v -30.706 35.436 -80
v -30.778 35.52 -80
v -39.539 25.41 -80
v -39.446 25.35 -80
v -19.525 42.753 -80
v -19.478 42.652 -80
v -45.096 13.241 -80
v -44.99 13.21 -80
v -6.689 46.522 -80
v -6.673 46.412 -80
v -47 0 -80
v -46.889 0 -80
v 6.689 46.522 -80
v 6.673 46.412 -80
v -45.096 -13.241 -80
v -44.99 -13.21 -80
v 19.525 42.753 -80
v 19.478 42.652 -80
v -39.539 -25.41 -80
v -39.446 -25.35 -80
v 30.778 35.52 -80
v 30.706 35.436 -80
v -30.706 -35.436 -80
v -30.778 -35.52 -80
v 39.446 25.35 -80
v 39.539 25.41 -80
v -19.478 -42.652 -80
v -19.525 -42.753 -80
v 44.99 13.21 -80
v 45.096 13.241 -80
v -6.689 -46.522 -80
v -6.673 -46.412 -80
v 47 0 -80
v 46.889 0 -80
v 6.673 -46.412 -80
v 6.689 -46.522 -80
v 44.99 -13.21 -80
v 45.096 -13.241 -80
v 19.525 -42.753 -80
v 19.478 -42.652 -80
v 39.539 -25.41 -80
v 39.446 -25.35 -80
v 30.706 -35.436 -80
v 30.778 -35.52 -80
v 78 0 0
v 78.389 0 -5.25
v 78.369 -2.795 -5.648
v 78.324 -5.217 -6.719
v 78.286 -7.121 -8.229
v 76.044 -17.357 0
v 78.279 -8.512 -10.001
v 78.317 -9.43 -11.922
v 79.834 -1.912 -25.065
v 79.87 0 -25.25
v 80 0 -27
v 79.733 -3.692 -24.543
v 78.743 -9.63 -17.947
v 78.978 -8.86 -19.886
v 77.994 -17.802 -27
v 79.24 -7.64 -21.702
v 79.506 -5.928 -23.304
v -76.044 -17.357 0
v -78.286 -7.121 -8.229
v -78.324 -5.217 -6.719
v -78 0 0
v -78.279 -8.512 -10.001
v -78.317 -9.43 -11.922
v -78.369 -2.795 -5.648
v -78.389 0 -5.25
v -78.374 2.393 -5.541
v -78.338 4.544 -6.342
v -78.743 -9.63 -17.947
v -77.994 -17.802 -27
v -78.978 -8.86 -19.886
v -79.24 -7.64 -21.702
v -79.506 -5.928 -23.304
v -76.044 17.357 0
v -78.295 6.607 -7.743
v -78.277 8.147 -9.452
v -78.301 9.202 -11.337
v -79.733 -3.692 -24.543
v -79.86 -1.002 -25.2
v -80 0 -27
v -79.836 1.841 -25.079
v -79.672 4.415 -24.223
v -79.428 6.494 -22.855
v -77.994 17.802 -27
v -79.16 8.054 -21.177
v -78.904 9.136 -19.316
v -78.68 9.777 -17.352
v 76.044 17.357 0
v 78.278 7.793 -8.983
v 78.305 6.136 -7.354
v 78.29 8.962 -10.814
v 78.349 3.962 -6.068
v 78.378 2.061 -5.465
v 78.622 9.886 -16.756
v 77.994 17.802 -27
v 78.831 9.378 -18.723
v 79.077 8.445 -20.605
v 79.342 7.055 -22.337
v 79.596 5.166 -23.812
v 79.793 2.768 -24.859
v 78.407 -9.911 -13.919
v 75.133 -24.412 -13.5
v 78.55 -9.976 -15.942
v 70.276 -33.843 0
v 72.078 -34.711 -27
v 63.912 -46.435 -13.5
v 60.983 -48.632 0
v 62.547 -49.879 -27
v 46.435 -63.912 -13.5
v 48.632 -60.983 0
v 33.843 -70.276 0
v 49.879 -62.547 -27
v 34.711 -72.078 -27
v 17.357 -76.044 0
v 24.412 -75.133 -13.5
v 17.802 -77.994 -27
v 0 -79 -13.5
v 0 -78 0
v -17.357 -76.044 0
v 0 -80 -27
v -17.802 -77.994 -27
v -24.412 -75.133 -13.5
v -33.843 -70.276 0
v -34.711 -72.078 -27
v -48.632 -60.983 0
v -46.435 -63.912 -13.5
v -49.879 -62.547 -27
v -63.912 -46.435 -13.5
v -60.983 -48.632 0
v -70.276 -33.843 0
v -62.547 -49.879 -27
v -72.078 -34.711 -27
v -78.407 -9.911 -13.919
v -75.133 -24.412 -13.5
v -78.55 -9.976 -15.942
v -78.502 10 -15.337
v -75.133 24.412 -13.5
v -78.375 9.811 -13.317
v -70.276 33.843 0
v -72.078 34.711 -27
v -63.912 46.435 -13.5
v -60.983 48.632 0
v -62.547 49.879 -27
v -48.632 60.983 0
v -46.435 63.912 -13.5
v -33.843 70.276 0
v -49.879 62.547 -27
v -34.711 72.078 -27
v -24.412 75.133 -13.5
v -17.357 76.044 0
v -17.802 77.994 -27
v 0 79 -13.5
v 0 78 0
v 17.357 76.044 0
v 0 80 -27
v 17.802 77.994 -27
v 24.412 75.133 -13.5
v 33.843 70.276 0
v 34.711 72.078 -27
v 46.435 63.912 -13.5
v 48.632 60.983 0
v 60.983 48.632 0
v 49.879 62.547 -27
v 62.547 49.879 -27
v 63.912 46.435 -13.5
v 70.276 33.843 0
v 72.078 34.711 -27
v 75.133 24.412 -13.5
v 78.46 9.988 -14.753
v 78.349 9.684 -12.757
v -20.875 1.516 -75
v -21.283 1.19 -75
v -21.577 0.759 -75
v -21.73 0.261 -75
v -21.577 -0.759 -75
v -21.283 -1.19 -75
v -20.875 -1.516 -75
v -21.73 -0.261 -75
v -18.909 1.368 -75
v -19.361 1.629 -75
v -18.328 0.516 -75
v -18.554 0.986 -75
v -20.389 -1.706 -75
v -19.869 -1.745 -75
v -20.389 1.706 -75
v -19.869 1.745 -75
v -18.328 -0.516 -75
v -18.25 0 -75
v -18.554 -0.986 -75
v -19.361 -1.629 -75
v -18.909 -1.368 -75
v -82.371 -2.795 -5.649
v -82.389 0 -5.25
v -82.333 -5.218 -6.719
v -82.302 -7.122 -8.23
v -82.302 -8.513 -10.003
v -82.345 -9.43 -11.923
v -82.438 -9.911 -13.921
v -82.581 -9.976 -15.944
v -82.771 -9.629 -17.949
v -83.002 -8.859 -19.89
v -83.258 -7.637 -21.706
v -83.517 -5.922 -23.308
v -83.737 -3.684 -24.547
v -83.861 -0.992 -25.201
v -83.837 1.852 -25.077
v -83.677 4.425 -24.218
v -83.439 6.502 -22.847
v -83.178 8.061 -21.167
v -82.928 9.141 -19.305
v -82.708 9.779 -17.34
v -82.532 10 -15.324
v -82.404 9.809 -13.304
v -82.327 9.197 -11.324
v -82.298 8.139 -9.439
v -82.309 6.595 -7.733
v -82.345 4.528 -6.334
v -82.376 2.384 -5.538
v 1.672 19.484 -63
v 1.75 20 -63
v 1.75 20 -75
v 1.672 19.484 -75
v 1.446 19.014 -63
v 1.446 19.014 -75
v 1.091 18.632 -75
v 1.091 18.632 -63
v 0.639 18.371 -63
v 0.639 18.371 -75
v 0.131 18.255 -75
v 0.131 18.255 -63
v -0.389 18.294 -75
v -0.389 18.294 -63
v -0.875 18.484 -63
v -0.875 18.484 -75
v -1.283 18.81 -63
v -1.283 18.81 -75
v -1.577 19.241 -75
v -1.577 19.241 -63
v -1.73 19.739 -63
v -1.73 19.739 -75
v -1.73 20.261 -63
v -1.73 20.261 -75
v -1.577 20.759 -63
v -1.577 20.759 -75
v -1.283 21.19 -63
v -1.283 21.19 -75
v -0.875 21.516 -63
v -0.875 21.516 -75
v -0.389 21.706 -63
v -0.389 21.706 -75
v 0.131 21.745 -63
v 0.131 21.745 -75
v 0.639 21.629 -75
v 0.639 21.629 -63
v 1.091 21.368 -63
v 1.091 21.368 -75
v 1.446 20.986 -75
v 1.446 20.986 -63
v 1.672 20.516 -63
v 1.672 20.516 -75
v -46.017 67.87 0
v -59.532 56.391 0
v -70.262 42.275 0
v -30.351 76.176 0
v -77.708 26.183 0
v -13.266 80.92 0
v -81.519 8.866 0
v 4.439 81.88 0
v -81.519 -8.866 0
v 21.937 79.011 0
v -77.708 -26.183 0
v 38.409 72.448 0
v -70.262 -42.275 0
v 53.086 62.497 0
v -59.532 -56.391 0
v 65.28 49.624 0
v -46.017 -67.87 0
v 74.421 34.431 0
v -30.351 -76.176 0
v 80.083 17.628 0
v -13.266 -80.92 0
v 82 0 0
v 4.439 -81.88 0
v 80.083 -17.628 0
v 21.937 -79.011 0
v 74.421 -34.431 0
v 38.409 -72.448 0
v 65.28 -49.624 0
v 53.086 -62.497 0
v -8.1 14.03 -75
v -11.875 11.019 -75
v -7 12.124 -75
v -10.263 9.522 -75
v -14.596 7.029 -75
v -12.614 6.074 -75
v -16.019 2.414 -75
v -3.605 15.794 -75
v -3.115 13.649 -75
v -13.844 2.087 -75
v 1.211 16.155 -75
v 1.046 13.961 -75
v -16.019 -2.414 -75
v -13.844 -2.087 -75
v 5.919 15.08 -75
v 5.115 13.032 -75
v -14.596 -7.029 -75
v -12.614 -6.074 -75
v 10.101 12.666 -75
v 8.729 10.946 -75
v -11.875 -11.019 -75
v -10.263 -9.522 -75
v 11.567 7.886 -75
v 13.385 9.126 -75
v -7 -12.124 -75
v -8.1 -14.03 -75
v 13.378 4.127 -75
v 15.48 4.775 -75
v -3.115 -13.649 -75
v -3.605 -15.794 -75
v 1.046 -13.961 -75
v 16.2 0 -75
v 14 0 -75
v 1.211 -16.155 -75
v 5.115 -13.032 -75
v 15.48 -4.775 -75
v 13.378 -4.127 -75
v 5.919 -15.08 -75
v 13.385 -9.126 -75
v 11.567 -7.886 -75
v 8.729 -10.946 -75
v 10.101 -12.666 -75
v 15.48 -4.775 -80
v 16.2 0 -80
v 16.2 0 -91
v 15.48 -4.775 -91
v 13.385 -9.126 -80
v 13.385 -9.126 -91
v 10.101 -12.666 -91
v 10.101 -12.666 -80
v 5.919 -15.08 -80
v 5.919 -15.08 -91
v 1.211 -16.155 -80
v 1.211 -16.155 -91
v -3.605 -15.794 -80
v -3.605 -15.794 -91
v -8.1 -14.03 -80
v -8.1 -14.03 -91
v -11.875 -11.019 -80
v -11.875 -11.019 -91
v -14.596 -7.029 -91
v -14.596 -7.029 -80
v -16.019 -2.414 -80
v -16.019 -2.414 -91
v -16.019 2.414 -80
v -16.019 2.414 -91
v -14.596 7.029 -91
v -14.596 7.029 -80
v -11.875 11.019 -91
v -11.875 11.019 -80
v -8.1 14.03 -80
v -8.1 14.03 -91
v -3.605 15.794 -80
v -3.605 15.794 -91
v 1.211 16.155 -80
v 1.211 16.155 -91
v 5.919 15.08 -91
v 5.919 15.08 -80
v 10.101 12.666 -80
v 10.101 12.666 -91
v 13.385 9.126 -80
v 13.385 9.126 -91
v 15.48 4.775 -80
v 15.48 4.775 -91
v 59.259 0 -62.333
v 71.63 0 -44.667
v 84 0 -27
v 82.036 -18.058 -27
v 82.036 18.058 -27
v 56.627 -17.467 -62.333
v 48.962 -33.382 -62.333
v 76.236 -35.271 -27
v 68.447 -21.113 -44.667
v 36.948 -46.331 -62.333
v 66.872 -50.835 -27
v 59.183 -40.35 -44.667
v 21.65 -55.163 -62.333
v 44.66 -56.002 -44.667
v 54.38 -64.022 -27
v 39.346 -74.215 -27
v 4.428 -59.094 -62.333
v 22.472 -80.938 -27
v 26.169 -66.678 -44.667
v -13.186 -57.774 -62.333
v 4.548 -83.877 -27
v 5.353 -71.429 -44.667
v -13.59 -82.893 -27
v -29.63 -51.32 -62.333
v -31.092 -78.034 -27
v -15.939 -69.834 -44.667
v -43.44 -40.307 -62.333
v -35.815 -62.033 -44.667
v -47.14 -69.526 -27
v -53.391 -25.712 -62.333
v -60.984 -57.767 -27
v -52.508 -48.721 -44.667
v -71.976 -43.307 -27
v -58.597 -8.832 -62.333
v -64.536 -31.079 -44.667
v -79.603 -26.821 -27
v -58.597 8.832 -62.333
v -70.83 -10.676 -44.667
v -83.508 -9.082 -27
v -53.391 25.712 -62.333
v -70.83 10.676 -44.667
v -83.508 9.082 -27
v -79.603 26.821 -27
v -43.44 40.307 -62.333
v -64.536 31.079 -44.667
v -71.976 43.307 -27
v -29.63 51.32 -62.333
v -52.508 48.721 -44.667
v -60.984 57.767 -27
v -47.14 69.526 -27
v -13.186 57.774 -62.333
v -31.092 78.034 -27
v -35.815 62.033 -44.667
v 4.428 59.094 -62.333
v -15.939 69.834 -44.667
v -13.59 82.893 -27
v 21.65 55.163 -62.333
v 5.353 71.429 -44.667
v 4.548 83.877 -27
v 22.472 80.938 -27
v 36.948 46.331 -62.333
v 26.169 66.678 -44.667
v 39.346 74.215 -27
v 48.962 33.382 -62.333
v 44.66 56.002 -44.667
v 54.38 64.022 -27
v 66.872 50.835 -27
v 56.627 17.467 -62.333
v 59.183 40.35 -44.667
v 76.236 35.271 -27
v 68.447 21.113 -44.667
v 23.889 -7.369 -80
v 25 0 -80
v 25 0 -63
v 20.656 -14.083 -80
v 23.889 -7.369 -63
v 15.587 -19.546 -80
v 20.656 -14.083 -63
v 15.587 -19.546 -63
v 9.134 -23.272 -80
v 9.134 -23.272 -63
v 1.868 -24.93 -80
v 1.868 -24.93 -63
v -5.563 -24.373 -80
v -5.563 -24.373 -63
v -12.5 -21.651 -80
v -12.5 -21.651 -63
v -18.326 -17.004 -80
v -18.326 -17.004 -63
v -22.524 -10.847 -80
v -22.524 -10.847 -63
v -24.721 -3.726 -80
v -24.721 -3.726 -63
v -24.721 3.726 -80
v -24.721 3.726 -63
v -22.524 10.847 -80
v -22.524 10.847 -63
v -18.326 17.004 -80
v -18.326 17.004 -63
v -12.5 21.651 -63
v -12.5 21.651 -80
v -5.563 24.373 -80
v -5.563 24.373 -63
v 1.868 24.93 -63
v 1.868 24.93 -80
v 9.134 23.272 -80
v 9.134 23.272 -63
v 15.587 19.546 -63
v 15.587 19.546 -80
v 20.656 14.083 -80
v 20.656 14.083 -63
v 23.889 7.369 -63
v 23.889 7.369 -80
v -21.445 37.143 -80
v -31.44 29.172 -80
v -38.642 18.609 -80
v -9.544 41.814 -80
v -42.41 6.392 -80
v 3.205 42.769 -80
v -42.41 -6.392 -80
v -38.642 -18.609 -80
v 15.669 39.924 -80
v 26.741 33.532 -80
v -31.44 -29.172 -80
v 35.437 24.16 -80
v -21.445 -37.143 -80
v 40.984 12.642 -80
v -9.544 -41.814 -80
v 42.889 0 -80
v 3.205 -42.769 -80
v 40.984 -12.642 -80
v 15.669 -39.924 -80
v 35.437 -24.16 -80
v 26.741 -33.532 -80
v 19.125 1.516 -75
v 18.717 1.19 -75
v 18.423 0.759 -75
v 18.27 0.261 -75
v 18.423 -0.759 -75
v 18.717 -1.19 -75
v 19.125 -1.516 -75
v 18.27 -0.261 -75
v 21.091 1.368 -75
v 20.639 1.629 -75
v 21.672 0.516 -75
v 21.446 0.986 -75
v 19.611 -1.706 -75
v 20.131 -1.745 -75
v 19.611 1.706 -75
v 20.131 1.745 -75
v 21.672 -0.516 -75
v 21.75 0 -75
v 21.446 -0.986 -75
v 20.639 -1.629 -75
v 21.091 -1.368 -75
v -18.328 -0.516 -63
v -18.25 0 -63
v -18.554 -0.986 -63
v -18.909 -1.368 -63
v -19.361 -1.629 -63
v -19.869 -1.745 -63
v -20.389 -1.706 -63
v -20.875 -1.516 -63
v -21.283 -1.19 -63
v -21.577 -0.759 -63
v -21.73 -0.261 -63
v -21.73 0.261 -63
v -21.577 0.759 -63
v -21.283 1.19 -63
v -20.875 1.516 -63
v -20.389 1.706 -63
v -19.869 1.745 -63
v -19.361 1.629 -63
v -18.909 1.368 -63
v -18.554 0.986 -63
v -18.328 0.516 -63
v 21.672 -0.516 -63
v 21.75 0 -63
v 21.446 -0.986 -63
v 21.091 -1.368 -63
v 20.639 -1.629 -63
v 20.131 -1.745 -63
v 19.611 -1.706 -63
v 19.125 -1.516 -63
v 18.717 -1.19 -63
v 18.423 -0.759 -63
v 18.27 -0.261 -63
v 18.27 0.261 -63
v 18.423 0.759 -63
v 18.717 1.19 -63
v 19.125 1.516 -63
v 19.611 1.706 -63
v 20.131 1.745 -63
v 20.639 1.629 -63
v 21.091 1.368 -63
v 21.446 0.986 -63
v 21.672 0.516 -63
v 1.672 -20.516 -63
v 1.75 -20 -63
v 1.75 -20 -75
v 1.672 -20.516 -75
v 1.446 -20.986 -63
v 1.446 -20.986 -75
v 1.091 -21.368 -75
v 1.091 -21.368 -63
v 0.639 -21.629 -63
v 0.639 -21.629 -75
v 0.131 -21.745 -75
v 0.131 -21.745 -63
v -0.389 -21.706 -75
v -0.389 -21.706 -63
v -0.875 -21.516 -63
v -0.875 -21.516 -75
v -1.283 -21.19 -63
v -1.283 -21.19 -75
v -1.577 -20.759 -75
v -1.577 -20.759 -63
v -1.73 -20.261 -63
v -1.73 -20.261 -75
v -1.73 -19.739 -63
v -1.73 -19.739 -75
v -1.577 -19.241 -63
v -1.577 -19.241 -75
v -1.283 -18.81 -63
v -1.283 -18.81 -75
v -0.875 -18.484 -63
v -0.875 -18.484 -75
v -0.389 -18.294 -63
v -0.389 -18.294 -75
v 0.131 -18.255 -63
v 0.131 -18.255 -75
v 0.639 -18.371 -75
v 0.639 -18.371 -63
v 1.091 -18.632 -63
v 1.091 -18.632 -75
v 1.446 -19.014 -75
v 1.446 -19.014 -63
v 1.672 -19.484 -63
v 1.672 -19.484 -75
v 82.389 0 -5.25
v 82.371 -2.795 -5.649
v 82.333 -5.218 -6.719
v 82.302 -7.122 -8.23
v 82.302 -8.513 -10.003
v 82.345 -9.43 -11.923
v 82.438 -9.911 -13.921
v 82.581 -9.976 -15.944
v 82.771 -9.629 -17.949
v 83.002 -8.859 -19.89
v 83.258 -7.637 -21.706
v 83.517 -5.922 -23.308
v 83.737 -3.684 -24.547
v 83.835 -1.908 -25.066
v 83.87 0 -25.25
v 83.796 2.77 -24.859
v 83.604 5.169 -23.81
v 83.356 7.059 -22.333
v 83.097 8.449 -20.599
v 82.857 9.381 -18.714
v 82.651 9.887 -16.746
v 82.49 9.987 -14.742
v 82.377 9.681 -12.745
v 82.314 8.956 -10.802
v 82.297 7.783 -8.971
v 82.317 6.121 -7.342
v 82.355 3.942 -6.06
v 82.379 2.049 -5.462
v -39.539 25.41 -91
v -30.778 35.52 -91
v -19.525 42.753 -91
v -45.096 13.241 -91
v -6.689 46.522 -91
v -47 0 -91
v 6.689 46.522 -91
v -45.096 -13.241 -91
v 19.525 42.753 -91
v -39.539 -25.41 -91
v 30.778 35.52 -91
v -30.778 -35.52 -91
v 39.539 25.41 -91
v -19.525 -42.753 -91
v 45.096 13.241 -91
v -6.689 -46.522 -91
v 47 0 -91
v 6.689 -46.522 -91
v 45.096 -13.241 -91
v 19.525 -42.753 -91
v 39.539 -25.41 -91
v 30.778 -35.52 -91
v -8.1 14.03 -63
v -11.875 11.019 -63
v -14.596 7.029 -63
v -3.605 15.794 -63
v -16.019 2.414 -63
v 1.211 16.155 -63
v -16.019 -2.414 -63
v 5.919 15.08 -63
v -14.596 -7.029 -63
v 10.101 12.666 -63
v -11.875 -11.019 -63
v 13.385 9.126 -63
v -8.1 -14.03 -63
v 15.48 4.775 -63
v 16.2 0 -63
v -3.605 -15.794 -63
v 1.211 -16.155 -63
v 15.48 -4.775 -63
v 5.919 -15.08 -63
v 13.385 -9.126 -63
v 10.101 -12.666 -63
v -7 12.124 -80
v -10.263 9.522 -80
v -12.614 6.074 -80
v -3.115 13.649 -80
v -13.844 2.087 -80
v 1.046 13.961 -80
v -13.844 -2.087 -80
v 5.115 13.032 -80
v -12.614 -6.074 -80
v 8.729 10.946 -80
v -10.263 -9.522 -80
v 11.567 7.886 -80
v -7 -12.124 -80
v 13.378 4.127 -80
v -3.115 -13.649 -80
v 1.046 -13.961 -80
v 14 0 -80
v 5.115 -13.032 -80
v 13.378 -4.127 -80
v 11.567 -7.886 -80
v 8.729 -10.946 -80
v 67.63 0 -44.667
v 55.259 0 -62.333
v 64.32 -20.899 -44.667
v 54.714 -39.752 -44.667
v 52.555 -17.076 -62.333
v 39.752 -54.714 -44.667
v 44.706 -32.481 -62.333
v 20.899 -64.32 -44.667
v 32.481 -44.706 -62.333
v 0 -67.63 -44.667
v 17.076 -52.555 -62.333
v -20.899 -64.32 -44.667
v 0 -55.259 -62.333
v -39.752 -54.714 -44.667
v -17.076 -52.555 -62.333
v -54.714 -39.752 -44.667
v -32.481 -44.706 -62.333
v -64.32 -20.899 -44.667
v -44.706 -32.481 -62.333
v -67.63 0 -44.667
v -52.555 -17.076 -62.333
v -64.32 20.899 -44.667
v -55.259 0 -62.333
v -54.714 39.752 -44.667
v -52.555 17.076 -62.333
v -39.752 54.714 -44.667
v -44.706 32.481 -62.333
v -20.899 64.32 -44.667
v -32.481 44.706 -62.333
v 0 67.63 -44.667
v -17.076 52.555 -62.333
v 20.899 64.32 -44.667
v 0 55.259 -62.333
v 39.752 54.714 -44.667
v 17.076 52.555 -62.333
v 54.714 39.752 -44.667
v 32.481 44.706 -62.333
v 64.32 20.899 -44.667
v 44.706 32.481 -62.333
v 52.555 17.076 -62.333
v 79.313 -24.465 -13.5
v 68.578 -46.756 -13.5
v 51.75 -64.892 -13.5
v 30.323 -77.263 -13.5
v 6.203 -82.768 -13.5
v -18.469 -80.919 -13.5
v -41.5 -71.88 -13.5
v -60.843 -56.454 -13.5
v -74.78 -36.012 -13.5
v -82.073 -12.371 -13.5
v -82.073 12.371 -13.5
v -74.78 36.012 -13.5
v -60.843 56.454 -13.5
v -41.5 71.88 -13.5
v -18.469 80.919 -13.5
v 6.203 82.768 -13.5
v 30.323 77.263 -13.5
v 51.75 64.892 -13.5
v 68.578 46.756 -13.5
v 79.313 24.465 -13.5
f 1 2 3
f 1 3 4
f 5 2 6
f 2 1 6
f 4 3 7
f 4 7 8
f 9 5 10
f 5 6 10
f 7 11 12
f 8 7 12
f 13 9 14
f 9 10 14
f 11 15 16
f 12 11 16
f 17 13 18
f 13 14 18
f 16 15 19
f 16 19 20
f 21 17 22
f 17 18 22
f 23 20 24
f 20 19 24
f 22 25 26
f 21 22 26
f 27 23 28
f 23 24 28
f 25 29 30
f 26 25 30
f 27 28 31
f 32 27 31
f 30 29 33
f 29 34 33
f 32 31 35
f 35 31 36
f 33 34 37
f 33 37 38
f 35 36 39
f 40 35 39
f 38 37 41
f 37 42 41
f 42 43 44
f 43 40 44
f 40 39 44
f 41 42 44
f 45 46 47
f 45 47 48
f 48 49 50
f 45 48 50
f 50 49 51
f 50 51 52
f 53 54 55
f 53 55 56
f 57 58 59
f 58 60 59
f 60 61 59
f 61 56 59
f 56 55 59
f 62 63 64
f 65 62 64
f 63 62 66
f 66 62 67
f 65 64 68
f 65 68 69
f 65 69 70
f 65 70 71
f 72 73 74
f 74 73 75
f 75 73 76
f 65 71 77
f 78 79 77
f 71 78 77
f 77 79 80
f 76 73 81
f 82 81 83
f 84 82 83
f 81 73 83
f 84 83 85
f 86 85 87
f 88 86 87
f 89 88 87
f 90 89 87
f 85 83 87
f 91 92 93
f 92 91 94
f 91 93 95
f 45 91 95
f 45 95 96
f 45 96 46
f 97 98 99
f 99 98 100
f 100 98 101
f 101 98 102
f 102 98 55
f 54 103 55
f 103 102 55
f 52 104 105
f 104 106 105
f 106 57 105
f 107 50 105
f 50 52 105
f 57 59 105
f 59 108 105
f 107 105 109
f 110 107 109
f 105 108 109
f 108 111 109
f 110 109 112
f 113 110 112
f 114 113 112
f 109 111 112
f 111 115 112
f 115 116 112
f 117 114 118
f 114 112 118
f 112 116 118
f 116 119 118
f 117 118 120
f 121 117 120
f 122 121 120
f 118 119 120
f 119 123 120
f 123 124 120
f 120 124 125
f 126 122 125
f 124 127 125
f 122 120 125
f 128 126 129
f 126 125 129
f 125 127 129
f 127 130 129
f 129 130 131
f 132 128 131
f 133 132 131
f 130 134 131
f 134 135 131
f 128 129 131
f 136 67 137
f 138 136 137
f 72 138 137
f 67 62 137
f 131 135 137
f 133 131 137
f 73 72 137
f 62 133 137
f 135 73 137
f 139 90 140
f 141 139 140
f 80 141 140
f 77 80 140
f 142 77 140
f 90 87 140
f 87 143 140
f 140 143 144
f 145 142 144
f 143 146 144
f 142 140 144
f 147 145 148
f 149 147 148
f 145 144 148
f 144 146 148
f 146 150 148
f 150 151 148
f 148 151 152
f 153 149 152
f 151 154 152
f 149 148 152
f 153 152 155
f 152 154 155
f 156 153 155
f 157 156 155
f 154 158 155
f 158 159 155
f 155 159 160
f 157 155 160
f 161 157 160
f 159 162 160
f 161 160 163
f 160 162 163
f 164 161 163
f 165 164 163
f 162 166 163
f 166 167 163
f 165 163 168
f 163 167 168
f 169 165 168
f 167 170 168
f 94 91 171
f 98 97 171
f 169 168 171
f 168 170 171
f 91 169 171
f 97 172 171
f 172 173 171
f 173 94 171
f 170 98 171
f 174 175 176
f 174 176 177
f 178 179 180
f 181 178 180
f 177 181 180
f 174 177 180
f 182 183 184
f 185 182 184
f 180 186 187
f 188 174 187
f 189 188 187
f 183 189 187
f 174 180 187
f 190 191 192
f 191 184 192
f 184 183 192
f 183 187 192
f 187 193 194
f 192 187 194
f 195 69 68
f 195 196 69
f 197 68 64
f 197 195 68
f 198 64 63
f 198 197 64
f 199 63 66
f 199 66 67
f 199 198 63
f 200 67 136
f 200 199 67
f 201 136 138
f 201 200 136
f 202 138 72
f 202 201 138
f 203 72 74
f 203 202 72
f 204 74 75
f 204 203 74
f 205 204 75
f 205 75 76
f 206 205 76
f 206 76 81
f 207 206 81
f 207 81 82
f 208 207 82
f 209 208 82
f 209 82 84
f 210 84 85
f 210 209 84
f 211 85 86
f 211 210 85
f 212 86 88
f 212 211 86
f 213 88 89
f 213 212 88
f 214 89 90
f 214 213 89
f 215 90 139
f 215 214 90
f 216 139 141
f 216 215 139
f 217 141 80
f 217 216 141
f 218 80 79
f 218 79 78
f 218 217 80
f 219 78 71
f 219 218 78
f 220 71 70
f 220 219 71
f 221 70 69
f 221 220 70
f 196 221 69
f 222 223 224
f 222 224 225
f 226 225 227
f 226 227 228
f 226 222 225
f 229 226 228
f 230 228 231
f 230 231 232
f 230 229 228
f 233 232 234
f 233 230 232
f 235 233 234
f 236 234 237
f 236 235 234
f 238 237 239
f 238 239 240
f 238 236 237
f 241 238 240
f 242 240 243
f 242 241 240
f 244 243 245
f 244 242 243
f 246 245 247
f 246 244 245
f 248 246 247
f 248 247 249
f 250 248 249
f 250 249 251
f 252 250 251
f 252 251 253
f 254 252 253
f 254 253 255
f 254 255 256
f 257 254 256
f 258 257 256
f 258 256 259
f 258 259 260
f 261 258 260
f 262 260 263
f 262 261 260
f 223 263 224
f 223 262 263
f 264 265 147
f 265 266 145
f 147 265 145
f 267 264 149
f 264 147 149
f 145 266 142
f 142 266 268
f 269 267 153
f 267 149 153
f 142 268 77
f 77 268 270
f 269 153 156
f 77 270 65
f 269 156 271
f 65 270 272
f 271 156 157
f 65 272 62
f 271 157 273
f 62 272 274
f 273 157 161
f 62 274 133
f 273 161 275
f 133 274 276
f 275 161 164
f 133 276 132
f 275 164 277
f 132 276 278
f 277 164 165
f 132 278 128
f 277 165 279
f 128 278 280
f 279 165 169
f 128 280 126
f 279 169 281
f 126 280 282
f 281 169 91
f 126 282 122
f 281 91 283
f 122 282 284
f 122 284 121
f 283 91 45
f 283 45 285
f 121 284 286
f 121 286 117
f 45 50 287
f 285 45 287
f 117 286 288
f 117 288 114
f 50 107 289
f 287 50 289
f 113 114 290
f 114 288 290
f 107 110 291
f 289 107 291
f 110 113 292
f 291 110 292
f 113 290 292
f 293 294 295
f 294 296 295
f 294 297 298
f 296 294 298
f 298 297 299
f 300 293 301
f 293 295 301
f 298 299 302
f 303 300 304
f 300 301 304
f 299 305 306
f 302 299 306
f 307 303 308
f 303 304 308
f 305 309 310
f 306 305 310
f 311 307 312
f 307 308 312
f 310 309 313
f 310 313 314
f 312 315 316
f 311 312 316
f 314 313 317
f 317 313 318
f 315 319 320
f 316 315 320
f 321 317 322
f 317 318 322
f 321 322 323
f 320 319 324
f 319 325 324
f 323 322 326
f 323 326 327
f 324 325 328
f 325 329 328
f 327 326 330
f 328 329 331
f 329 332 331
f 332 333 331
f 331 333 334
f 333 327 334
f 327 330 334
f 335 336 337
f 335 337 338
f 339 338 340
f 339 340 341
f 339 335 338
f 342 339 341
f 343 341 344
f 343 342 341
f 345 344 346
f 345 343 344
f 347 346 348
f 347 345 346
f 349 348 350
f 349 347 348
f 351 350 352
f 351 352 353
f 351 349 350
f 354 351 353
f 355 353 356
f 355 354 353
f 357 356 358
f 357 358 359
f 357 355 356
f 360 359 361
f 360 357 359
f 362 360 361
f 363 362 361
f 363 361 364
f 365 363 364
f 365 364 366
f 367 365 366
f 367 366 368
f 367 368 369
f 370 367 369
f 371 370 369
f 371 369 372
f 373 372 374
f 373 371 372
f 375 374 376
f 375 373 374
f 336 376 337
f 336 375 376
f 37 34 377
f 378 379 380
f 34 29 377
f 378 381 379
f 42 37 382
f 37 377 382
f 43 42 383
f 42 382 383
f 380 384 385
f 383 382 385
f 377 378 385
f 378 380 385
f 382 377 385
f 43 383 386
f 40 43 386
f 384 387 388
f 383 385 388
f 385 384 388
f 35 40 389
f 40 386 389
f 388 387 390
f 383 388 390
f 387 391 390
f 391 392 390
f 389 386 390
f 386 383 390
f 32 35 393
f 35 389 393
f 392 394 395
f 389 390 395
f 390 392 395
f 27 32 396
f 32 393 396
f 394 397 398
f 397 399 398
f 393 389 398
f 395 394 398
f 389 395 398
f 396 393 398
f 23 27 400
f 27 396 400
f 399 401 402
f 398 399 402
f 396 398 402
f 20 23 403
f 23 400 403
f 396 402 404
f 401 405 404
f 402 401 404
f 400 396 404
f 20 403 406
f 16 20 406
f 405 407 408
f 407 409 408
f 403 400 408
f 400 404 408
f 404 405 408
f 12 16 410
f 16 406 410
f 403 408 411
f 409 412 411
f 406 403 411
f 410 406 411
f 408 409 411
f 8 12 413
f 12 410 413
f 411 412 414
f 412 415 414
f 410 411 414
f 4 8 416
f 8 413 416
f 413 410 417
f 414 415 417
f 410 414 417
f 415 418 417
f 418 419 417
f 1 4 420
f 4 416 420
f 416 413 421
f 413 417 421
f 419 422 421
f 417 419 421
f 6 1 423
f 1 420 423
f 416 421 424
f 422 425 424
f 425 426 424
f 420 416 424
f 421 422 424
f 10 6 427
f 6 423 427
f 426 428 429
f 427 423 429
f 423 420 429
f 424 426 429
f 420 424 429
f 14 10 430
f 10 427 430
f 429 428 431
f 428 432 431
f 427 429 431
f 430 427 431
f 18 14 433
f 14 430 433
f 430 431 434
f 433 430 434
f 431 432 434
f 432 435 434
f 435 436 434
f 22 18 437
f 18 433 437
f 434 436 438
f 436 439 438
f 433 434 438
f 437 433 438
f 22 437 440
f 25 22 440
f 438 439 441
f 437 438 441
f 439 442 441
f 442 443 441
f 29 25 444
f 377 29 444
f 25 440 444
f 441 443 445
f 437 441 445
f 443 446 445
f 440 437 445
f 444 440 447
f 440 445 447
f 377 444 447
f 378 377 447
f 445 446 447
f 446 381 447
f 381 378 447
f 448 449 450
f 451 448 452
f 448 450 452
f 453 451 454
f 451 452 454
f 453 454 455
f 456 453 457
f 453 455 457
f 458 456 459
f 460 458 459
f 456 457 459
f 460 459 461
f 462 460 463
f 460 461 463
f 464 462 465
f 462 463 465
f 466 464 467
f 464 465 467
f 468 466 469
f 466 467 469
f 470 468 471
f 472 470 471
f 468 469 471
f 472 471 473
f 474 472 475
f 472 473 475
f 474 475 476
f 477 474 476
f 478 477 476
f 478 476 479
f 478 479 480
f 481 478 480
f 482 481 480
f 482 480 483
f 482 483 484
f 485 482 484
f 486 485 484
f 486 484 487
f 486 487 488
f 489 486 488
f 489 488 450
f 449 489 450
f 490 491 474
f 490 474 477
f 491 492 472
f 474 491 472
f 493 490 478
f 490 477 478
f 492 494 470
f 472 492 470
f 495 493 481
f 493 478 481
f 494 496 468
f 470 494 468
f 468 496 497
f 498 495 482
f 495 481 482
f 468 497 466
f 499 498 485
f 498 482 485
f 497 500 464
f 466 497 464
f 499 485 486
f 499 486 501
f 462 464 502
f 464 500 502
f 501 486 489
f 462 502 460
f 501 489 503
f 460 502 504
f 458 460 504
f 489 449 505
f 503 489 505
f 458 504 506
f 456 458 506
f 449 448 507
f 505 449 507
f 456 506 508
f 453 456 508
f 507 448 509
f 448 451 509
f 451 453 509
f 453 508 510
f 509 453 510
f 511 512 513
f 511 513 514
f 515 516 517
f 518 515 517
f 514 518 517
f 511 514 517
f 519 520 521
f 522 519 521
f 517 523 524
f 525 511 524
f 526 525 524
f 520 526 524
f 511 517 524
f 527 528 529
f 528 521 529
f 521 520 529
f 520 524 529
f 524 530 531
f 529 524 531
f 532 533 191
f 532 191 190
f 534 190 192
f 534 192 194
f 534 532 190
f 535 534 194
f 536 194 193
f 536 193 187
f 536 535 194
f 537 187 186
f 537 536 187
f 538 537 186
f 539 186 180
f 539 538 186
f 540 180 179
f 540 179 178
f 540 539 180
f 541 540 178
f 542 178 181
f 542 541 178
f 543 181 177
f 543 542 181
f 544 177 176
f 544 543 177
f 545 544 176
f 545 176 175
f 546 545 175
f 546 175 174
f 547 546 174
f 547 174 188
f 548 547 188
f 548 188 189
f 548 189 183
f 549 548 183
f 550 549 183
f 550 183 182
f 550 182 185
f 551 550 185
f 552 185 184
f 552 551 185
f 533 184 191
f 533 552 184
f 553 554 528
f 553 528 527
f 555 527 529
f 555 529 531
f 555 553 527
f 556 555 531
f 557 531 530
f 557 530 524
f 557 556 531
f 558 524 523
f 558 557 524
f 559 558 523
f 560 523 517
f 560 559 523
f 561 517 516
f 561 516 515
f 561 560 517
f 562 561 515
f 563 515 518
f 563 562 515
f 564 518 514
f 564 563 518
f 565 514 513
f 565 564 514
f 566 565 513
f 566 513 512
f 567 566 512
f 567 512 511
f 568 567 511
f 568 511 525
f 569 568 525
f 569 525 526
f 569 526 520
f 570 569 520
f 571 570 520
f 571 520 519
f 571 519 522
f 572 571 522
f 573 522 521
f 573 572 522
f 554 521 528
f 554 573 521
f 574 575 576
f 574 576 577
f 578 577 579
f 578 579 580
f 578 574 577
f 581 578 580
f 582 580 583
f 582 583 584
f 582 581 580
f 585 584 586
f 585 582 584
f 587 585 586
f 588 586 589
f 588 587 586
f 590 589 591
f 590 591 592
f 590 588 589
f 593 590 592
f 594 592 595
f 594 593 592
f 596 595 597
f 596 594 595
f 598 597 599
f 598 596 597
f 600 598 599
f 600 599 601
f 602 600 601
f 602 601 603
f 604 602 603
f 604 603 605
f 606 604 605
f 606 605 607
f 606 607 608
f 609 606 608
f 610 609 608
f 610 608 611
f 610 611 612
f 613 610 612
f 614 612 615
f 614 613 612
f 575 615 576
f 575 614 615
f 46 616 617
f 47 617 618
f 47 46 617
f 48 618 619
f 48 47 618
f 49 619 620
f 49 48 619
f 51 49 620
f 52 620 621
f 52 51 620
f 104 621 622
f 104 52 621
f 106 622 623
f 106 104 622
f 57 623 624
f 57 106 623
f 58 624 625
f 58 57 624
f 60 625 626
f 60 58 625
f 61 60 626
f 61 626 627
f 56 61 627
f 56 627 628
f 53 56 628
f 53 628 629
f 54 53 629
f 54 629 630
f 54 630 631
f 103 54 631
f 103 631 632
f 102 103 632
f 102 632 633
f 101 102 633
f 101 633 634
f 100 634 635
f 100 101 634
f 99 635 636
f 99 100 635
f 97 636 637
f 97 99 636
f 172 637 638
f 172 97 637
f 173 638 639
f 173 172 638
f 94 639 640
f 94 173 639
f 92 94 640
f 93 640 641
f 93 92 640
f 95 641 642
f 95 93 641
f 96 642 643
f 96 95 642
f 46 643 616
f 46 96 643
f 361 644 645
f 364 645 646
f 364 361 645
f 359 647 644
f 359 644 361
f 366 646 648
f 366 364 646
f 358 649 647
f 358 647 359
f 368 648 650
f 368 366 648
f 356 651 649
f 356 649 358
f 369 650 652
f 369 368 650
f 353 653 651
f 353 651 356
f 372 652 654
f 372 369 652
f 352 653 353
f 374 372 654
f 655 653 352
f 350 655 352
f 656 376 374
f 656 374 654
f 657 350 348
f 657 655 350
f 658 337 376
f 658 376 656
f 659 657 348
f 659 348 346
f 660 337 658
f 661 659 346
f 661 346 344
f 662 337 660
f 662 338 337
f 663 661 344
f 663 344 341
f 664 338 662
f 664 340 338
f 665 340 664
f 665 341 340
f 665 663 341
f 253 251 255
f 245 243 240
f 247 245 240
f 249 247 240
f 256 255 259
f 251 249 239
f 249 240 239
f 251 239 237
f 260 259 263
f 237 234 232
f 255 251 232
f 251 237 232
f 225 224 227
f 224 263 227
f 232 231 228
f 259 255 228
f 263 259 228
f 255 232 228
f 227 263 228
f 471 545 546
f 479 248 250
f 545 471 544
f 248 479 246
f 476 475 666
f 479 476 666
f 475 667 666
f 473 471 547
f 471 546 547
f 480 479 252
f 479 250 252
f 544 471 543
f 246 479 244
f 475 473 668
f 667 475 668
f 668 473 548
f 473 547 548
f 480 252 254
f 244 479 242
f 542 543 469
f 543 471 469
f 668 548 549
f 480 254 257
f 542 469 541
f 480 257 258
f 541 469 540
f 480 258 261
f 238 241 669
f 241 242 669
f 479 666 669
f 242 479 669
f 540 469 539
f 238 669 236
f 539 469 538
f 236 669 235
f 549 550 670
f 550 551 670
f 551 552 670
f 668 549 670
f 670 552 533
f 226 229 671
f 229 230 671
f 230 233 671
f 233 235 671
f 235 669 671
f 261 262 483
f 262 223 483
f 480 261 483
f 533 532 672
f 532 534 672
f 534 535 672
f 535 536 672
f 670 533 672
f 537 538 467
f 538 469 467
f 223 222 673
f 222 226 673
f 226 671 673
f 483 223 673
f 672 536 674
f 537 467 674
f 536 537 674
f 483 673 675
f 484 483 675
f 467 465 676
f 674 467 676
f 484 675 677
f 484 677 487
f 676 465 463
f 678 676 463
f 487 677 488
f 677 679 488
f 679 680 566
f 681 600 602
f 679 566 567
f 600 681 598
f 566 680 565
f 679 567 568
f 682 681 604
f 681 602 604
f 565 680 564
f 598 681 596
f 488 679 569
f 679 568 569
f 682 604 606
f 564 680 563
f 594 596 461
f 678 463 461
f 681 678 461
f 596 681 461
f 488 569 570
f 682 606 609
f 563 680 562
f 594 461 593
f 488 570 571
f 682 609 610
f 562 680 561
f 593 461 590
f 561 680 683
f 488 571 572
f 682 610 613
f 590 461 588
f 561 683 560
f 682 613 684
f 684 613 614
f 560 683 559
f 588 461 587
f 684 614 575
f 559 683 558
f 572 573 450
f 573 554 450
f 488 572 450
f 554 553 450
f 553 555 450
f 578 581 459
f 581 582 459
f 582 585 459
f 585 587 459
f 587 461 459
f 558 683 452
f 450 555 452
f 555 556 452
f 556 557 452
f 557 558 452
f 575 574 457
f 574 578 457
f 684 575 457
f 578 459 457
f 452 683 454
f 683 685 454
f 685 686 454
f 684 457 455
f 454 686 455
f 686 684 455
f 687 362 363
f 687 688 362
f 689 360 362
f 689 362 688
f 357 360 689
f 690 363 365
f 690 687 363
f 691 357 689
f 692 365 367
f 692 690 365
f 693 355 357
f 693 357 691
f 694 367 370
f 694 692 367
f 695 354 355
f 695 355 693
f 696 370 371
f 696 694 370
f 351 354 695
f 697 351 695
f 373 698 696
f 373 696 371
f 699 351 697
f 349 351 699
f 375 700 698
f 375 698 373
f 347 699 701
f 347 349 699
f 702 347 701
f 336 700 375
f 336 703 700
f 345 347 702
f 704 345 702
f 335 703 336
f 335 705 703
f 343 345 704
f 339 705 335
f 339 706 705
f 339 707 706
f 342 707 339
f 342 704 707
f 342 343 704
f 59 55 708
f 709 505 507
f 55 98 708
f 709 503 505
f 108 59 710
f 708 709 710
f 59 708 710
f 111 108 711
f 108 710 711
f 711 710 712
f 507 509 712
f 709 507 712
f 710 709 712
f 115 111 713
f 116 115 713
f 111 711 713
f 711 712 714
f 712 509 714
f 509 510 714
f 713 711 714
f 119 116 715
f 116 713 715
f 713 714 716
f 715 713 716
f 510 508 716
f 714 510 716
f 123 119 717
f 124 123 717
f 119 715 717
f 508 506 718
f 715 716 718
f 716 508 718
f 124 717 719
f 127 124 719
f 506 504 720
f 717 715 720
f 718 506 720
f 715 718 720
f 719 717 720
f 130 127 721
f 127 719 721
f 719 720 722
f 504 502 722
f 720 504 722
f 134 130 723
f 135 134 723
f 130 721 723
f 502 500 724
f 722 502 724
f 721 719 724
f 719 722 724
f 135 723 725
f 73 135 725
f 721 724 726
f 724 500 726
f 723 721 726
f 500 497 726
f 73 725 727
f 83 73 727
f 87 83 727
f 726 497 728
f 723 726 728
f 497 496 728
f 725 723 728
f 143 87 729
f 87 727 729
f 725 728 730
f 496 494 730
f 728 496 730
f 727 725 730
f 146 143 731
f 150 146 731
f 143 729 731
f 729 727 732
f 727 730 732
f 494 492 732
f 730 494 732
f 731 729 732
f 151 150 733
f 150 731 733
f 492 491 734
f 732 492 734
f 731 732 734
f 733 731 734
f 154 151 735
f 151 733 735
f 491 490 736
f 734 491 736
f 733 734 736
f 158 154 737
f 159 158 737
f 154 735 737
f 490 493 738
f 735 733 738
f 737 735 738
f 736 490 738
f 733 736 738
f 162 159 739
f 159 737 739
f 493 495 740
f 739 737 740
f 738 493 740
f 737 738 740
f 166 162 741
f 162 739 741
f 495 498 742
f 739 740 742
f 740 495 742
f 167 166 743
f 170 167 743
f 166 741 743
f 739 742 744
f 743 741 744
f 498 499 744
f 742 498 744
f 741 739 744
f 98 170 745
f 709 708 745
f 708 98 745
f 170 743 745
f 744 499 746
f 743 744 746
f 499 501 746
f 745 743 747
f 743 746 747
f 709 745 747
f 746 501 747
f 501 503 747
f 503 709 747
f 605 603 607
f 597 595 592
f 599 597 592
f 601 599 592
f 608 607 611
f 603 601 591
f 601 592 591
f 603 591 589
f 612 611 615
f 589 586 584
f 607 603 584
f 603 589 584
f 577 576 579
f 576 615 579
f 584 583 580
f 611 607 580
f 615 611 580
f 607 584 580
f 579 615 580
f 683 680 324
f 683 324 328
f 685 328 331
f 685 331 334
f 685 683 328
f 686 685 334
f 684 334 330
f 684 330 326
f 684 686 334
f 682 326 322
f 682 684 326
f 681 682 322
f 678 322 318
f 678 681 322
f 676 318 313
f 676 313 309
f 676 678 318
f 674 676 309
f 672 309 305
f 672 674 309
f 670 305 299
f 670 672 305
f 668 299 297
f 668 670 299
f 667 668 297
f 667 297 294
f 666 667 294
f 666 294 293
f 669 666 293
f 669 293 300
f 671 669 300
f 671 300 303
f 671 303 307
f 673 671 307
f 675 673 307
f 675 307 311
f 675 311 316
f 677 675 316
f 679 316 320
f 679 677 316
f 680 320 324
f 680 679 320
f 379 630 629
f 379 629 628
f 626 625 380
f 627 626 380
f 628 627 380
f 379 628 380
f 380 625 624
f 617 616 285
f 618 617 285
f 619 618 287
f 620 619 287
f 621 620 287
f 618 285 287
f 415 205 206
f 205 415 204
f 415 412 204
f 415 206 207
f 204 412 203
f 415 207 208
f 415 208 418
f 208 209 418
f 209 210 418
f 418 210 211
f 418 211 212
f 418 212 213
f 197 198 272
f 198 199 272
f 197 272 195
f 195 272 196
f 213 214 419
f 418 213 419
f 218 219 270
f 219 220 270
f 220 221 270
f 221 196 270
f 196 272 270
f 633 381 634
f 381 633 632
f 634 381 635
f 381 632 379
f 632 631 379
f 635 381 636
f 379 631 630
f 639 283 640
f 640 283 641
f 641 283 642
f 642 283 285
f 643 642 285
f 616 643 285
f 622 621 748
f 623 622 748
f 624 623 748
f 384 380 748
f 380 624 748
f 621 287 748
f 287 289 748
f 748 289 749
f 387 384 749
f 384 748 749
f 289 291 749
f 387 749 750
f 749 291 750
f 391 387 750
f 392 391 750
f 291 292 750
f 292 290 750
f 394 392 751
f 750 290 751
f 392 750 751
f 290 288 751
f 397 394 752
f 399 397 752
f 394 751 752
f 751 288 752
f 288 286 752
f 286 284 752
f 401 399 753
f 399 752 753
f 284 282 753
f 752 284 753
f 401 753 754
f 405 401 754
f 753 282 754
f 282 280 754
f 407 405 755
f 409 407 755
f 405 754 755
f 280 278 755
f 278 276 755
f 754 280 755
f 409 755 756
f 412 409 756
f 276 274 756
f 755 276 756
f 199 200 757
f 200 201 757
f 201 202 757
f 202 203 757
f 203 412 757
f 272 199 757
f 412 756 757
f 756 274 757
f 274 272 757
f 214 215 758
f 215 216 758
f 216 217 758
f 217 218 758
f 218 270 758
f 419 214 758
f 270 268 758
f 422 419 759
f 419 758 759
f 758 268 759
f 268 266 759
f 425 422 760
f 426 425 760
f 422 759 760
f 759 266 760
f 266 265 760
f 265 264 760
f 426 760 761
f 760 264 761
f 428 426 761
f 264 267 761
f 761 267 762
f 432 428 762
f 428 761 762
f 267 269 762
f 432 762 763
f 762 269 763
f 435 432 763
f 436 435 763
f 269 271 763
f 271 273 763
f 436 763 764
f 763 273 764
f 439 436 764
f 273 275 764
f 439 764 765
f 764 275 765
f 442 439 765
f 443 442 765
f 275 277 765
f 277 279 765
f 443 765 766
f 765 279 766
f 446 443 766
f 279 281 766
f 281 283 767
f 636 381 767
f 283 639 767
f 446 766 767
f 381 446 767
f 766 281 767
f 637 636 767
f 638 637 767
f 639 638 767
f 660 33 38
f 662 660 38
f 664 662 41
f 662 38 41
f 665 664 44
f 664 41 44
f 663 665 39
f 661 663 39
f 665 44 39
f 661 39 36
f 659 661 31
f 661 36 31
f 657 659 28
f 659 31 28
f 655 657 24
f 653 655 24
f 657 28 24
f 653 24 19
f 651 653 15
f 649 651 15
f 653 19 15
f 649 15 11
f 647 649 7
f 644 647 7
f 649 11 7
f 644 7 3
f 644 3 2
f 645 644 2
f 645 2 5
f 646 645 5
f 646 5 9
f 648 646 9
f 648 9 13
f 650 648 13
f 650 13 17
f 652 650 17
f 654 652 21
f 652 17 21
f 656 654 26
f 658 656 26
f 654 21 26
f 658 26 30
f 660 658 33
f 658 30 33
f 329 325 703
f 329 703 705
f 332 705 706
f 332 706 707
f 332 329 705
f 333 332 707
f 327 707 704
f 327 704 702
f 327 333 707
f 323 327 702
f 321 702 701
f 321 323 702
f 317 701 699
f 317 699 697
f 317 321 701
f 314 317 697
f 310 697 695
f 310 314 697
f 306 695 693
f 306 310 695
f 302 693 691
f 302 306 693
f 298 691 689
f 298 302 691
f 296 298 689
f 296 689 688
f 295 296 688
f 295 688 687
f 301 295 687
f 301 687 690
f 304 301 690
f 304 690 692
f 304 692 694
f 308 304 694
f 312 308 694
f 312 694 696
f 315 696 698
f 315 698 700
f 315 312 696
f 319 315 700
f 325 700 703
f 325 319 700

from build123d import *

# Parameters (mm, degrees)
CYLINDER_R                        = 10
CYLINDER_DEPTH                    = 250
CYLINDER_PITCH_ANGLE              = 90
REVOLVE_ONTO_SKETCH006_ROLL_ANGLE = 90
SKETCH003_R                       = 25
SKETCH003_R_2                     = 14
EXTRUDE003_DEPTH                  = 5
SKETCH005_R                       = 1.75
EXTRUDE005_DEPTH                  = 12
SKETCH004_R                       = 25
SKETCH004_R_2                     = 16.2
EXTRUDE004_DEPTH                  = 12
SKETCH002_R                       = 47
SKETCH002_R_2                     = 16.2
EXTRUDE002_DEPTH                  = 11
FUSION001_PLACEMENT_ANGLE         = 180


with BuildPart() as cylinder:
    # Cylinder → Cylinder (new body)
    with BuildSketch(Plane.XY):
        Circle(CYLINDER_R)
    extrude(amount=CYLINDER_DEPTH)


with BuildPart() as cylinder_1:
    # Cylinder pitch: moved
    add(cylinder.part.rotate(Axis((0, 0, 0), (0, 1, 0)), CYLINDER_PITCH_ANGLE))


with BuildPart() as cylinder_2:
    # Cylinder placement: moved
    add(cylinder_1.part.moved(Location((-125, 0, 15.25))))


with BuildPart() as cut001:
    # Sketch006 as drawn → Revolve (revolve)
    with BuildSketch(Plane.XY):
        Polygon((80, 27), (42.889, 80), (46.889, 80), (84, 27), (82, 0), (78, 0), align=None)
    revolve(axis=Axis((0, 0, 0), (0, 1, 0)))


with BuildPart() as cut001_1:
    # Revolve onto Sketch006 roll: moved
    add(cut001.part.rotate(Axis((0, 0, 0), (1, 0, 0)), REVOLVE_ONTO_SKETCH006_ROLL_ANGLE))


with BuildPart() as cut001_2:
    # Revolve onto Sketch006 placement: moved
    add(cut001_1.part)

    # Cut001: cut Cylinder
    add(cylinder_2.part, mode=Mode.SUBTRACT)


with BuildPart() as extrude003:
    # Sketch003 → Extrude003 (new body)
    with BuildSketch(Plane.XY):
        Circle(SKETCH003_R)
        Circle(SKETCH003_R_2, mode=Mode.SUBTRACT)
    extrude(amount=EXTRUDE003_DEPTH)


with BuildPart() as extrude003_1:
    # Extrude003 placement: moved
    add(extrude003.part.moved(Location((0, 0, 12))))


with BuildPart() as extrude005:
    # Sketch005 → Extrude005 (new body)
    with BuildSketch(Plane.XY):
        with Locations((-20, 0)):
            Circle(SKETCH005_R)
        with Locations((0, -20)):
            Circle(SKETCH005_R)
        with Locations((20, 0)):
            Circle(SKETCH005_R)
        with Locations((0, 20)):
            Circle(SKETCH005_R)
    extrude(amount=EXTRUDE005_DEPTH)


with BuildPart() as cut:
    # Sketch004 → Extrude004 (new body)
    with BuildSketch(Plane.XY):
        Circle(SKETCH004_R)
        Circle(SKETCH004_R_2, mode=Mode.SUBTRACT)
    extrude(amount=EXTRUDE004_DEPTH)

    # Cut: cut Extrude005
    add(extrude005.part, mode=Mode.SUBTRACT)


with BuildPart() as fusion001:
    # Sketch002 → Extrude002 (new body)
    with BuildSketch(Plane.XY):
        Circle(SKETCH002_R)
        Circle(SKETCH002_R_2, mode=Mode.SUBTRACT)
    extrude(amount=EXTRUDE002_DEPTH)


with BuildPart() as fusion001_1:
    # Extrude002 placement: moved
    add(fusion001.part.moved(Location((0, 0, 17))))

    # Fusion: union Extrude003, Cut
    add(extrude003_1.part)
    add(cut.part)


with BuildPart() as fusion001_2:
    # Fusion placement: moved
    add(fusion001_1.part.moved(Location((0, 0, 63))))

    # Fusion001: union Cut001
    add(cut001_2.part)


with BuildPart() as fusion001_3:
    # Fusion001 placement: moved
    add(fusion001_2.part.rotate(Axis((0, 0, 0), (1, 0, 0)), FUSION001_PLACEMENT_ANGLE))


solid = fusion001_3.part
